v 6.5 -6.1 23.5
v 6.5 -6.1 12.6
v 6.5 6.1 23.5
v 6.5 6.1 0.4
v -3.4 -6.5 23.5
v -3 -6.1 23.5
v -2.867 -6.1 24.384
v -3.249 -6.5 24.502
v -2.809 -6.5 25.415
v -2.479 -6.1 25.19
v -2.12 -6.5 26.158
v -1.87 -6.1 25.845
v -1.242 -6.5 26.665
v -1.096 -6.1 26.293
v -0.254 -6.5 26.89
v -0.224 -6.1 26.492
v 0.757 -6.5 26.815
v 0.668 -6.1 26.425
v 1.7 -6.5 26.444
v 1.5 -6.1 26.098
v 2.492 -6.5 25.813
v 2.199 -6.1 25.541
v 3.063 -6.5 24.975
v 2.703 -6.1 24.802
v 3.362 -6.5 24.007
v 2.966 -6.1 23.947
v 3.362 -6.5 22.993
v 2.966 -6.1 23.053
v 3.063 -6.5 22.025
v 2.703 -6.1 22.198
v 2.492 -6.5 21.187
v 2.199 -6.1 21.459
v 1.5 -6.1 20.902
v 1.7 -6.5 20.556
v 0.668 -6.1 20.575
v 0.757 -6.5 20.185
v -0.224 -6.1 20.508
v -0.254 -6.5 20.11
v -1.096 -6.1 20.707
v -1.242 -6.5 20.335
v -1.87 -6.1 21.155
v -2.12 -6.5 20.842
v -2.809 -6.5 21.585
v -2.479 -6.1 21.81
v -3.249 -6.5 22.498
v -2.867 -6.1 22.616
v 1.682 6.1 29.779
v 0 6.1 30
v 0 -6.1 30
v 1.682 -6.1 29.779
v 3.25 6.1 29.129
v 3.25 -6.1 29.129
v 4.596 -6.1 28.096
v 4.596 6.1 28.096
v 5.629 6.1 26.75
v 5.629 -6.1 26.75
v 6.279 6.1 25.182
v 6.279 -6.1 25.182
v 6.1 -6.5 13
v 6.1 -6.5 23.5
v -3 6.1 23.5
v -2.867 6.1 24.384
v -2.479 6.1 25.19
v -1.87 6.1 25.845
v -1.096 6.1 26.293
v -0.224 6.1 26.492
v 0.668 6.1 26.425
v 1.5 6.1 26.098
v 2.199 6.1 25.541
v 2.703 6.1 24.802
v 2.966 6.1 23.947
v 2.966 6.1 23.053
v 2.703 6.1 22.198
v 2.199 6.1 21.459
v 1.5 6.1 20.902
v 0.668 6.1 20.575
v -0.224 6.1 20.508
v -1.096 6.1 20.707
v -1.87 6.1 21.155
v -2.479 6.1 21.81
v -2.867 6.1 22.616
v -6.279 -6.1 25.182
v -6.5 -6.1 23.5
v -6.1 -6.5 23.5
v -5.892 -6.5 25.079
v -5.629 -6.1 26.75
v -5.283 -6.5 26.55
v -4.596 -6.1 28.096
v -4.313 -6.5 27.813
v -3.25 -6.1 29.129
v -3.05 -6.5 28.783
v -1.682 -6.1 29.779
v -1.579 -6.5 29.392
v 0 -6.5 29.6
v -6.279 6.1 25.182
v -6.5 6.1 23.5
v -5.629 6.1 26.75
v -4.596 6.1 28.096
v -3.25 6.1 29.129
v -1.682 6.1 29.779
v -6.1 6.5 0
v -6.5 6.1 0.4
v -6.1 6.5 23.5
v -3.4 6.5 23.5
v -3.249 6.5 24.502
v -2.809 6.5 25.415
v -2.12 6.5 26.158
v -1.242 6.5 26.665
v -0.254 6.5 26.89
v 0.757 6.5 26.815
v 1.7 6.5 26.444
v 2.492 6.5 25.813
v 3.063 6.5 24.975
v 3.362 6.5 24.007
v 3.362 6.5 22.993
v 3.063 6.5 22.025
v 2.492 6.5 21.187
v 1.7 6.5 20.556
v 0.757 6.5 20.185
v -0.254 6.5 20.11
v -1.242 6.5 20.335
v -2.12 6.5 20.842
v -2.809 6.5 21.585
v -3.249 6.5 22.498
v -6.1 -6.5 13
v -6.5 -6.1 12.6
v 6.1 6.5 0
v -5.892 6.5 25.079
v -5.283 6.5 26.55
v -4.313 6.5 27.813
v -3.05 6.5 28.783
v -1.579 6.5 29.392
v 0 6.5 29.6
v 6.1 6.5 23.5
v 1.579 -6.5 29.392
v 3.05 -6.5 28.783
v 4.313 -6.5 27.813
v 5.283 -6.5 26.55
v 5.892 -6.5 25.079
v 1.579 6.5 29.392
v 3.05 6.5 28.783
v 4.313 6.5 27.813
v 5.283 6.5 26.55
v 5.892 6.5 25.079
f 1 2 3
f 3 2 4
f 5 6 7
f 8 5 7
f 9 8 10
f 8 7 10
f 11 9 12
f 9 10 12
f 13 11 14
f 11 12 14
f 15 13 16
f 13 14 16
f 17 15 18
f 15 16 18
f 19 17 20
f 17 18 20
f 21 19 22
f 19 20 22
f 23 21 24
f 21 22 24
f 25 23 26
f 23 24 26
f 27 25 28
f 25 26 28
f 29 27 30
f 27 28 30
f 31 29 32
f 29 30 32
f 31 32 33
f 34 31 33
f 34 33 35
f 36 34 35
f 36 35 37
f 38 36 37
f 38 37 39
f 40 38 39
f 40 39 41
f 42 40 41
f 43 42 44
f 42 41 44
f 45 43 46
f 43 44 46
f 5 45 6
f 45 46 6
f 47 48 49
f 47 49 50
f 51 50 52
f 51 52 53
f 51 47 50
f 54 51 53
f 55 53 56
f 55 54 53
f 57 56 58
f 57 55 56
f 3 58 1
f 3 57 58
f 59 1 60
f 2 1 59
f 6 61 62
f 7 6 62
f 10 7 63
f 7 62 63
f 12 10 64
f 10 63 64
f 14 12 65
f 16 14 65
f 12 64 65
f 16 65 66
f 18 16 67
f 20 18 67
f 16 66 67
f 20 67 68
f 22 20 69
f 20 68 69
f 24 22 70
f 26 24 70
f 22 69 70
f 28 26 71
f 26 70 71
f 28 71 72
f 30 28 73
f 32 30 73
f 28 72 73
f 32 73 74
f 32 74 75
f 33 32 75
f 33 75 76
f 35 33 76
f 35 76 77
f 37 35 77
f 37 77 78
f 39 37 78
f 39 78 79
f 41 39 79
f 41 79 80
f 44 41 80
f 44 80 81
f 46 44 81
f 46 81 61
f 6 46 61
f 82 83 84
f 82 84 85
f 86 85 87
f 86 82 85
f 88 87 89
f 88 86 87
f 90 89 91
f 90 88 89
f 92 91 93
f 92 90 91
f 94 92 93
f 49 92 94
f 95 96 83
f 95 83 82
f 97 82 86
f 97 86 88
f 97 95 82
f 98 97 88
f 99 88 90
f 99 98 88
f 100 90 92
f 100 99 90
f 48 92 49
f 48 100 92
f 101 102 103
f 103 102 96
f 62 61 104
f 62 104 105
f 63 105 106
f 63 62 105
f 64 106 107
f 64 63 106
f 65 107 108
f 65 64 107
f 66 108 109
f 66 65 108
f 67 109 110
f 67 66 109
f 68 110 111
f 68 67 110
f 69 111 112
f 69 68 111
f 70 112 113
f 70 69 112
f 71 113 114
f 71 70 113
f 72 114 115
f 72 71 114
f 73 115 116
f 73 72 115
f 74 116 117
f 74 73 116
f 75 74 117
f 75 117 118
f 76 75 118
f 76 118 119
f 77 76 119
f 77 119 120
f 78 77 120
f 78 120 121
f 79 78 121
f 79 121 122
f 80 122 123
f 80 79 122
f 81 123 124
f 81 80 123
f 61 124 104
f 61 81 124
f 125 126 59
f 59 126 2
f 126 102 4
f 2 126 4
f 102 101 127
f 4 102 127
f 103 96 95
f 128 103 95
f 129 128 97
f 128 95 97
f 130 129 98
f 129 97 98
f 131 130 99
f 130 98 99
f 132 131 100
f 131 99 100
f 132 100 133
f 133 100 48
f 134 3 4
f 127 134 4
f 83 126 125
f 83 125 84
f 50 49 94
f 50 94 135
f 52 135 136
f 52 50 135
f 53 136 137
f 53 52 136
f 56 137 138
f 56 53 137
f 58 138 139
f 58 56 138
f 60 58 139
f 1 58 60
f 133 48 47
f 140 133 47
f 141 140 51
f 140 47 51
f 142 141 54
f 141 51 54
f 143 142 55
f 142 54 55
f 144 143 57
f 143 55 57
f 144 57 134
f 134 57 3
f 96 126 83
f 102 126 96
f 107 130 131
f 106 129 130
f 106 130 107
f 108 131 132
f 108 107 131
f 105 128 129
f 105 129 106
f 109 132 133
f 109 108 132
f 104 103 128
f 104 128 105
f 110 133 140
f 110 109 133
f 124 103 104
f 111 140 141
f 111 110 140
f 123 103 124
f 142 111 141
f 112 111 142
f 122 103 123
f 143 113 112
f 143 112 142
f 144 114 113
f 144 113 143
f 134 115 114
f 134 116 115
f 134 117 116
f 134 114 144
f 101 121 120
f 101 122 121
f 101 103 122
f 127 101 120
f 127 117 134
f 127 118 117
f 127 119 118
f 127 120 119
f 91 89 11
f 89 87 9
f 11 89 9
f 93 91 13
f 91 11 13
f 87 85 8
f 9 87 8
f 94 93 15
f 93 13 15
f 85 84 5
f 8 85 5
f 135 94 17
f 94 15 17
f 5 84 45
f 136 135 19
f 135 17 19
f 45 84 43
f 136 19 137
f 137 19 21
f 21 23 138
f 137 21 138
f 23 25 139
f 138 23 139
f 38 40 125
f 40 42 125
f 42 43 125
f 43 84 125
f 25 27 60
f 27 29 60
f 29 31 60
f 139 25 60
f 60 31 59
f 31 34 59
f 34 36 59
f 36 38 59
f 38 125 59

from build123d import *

# Parameters (mm, degrees)
F0_W     = 13
F0_H     = 13
F1_DEPTH = 30
F2_SIZE  = 12.99999
F3_R     = 6.49999
F4_R     = 3
F5_DEPTH = 25
F6_SIZE  = 0.4


# Not quite as in the source:
# - a fillet or chamfer is up to 0.001 mm smaller than in the source, because OpenCascade refuses the exact size


with BuildPart() as f1:
    # F0 (on Top) → F1 (new body)
    with BuildSketch(Plane.XY):
        Rectangle(F0_W, F0_H)
    extrude(amount=F1_DEPTH)

    # F2 (size 13 in the source; OpenCascade refuses exactly that, so slightly less here)
    f2_edges = [f1.edges().sort_by_distance(p)[0] for p in [
        (0, -6.5, 0),
    ]]
    chamfer(f2_edges, length=F2_SIZE)

    # F3 (radius 6.5 in the source; OpenCascade refuses exactly that, so slightly less here)
    f3_edges = [f1.edges().sort_by_distance(p)[0] for p in [
        (6.5, 0, 30),
        (-6.5, 0, 30),
    ]]
    fillet(f3_edges, radius=F3_R)

    # F4 (on face) → F5 (cut)
    with BuildSketch(Plane(origin=(0, 6.5, 0), x_dir=(-1, 0, 0), z_dir=(0, 1, 0))):
        with Locations((0, 23.5)):
            Circle(F4_R)
    extrude(amount=-F5_DEPTH, mode=Mode.SUBTRACT)

    # F6
    f6_edges = [f1.edges().sort_by_distance(p)[0] for p in [
        (4.596197, 6.5, 28.096197),
        (4.596197, -6.5, 28.096197),
        (3, 6.5, 23.5),
        (3, -6.5, 23.5),
    ]]
    chamfer(f6_edges, length=F6_SIZE)


solid = f1.part
